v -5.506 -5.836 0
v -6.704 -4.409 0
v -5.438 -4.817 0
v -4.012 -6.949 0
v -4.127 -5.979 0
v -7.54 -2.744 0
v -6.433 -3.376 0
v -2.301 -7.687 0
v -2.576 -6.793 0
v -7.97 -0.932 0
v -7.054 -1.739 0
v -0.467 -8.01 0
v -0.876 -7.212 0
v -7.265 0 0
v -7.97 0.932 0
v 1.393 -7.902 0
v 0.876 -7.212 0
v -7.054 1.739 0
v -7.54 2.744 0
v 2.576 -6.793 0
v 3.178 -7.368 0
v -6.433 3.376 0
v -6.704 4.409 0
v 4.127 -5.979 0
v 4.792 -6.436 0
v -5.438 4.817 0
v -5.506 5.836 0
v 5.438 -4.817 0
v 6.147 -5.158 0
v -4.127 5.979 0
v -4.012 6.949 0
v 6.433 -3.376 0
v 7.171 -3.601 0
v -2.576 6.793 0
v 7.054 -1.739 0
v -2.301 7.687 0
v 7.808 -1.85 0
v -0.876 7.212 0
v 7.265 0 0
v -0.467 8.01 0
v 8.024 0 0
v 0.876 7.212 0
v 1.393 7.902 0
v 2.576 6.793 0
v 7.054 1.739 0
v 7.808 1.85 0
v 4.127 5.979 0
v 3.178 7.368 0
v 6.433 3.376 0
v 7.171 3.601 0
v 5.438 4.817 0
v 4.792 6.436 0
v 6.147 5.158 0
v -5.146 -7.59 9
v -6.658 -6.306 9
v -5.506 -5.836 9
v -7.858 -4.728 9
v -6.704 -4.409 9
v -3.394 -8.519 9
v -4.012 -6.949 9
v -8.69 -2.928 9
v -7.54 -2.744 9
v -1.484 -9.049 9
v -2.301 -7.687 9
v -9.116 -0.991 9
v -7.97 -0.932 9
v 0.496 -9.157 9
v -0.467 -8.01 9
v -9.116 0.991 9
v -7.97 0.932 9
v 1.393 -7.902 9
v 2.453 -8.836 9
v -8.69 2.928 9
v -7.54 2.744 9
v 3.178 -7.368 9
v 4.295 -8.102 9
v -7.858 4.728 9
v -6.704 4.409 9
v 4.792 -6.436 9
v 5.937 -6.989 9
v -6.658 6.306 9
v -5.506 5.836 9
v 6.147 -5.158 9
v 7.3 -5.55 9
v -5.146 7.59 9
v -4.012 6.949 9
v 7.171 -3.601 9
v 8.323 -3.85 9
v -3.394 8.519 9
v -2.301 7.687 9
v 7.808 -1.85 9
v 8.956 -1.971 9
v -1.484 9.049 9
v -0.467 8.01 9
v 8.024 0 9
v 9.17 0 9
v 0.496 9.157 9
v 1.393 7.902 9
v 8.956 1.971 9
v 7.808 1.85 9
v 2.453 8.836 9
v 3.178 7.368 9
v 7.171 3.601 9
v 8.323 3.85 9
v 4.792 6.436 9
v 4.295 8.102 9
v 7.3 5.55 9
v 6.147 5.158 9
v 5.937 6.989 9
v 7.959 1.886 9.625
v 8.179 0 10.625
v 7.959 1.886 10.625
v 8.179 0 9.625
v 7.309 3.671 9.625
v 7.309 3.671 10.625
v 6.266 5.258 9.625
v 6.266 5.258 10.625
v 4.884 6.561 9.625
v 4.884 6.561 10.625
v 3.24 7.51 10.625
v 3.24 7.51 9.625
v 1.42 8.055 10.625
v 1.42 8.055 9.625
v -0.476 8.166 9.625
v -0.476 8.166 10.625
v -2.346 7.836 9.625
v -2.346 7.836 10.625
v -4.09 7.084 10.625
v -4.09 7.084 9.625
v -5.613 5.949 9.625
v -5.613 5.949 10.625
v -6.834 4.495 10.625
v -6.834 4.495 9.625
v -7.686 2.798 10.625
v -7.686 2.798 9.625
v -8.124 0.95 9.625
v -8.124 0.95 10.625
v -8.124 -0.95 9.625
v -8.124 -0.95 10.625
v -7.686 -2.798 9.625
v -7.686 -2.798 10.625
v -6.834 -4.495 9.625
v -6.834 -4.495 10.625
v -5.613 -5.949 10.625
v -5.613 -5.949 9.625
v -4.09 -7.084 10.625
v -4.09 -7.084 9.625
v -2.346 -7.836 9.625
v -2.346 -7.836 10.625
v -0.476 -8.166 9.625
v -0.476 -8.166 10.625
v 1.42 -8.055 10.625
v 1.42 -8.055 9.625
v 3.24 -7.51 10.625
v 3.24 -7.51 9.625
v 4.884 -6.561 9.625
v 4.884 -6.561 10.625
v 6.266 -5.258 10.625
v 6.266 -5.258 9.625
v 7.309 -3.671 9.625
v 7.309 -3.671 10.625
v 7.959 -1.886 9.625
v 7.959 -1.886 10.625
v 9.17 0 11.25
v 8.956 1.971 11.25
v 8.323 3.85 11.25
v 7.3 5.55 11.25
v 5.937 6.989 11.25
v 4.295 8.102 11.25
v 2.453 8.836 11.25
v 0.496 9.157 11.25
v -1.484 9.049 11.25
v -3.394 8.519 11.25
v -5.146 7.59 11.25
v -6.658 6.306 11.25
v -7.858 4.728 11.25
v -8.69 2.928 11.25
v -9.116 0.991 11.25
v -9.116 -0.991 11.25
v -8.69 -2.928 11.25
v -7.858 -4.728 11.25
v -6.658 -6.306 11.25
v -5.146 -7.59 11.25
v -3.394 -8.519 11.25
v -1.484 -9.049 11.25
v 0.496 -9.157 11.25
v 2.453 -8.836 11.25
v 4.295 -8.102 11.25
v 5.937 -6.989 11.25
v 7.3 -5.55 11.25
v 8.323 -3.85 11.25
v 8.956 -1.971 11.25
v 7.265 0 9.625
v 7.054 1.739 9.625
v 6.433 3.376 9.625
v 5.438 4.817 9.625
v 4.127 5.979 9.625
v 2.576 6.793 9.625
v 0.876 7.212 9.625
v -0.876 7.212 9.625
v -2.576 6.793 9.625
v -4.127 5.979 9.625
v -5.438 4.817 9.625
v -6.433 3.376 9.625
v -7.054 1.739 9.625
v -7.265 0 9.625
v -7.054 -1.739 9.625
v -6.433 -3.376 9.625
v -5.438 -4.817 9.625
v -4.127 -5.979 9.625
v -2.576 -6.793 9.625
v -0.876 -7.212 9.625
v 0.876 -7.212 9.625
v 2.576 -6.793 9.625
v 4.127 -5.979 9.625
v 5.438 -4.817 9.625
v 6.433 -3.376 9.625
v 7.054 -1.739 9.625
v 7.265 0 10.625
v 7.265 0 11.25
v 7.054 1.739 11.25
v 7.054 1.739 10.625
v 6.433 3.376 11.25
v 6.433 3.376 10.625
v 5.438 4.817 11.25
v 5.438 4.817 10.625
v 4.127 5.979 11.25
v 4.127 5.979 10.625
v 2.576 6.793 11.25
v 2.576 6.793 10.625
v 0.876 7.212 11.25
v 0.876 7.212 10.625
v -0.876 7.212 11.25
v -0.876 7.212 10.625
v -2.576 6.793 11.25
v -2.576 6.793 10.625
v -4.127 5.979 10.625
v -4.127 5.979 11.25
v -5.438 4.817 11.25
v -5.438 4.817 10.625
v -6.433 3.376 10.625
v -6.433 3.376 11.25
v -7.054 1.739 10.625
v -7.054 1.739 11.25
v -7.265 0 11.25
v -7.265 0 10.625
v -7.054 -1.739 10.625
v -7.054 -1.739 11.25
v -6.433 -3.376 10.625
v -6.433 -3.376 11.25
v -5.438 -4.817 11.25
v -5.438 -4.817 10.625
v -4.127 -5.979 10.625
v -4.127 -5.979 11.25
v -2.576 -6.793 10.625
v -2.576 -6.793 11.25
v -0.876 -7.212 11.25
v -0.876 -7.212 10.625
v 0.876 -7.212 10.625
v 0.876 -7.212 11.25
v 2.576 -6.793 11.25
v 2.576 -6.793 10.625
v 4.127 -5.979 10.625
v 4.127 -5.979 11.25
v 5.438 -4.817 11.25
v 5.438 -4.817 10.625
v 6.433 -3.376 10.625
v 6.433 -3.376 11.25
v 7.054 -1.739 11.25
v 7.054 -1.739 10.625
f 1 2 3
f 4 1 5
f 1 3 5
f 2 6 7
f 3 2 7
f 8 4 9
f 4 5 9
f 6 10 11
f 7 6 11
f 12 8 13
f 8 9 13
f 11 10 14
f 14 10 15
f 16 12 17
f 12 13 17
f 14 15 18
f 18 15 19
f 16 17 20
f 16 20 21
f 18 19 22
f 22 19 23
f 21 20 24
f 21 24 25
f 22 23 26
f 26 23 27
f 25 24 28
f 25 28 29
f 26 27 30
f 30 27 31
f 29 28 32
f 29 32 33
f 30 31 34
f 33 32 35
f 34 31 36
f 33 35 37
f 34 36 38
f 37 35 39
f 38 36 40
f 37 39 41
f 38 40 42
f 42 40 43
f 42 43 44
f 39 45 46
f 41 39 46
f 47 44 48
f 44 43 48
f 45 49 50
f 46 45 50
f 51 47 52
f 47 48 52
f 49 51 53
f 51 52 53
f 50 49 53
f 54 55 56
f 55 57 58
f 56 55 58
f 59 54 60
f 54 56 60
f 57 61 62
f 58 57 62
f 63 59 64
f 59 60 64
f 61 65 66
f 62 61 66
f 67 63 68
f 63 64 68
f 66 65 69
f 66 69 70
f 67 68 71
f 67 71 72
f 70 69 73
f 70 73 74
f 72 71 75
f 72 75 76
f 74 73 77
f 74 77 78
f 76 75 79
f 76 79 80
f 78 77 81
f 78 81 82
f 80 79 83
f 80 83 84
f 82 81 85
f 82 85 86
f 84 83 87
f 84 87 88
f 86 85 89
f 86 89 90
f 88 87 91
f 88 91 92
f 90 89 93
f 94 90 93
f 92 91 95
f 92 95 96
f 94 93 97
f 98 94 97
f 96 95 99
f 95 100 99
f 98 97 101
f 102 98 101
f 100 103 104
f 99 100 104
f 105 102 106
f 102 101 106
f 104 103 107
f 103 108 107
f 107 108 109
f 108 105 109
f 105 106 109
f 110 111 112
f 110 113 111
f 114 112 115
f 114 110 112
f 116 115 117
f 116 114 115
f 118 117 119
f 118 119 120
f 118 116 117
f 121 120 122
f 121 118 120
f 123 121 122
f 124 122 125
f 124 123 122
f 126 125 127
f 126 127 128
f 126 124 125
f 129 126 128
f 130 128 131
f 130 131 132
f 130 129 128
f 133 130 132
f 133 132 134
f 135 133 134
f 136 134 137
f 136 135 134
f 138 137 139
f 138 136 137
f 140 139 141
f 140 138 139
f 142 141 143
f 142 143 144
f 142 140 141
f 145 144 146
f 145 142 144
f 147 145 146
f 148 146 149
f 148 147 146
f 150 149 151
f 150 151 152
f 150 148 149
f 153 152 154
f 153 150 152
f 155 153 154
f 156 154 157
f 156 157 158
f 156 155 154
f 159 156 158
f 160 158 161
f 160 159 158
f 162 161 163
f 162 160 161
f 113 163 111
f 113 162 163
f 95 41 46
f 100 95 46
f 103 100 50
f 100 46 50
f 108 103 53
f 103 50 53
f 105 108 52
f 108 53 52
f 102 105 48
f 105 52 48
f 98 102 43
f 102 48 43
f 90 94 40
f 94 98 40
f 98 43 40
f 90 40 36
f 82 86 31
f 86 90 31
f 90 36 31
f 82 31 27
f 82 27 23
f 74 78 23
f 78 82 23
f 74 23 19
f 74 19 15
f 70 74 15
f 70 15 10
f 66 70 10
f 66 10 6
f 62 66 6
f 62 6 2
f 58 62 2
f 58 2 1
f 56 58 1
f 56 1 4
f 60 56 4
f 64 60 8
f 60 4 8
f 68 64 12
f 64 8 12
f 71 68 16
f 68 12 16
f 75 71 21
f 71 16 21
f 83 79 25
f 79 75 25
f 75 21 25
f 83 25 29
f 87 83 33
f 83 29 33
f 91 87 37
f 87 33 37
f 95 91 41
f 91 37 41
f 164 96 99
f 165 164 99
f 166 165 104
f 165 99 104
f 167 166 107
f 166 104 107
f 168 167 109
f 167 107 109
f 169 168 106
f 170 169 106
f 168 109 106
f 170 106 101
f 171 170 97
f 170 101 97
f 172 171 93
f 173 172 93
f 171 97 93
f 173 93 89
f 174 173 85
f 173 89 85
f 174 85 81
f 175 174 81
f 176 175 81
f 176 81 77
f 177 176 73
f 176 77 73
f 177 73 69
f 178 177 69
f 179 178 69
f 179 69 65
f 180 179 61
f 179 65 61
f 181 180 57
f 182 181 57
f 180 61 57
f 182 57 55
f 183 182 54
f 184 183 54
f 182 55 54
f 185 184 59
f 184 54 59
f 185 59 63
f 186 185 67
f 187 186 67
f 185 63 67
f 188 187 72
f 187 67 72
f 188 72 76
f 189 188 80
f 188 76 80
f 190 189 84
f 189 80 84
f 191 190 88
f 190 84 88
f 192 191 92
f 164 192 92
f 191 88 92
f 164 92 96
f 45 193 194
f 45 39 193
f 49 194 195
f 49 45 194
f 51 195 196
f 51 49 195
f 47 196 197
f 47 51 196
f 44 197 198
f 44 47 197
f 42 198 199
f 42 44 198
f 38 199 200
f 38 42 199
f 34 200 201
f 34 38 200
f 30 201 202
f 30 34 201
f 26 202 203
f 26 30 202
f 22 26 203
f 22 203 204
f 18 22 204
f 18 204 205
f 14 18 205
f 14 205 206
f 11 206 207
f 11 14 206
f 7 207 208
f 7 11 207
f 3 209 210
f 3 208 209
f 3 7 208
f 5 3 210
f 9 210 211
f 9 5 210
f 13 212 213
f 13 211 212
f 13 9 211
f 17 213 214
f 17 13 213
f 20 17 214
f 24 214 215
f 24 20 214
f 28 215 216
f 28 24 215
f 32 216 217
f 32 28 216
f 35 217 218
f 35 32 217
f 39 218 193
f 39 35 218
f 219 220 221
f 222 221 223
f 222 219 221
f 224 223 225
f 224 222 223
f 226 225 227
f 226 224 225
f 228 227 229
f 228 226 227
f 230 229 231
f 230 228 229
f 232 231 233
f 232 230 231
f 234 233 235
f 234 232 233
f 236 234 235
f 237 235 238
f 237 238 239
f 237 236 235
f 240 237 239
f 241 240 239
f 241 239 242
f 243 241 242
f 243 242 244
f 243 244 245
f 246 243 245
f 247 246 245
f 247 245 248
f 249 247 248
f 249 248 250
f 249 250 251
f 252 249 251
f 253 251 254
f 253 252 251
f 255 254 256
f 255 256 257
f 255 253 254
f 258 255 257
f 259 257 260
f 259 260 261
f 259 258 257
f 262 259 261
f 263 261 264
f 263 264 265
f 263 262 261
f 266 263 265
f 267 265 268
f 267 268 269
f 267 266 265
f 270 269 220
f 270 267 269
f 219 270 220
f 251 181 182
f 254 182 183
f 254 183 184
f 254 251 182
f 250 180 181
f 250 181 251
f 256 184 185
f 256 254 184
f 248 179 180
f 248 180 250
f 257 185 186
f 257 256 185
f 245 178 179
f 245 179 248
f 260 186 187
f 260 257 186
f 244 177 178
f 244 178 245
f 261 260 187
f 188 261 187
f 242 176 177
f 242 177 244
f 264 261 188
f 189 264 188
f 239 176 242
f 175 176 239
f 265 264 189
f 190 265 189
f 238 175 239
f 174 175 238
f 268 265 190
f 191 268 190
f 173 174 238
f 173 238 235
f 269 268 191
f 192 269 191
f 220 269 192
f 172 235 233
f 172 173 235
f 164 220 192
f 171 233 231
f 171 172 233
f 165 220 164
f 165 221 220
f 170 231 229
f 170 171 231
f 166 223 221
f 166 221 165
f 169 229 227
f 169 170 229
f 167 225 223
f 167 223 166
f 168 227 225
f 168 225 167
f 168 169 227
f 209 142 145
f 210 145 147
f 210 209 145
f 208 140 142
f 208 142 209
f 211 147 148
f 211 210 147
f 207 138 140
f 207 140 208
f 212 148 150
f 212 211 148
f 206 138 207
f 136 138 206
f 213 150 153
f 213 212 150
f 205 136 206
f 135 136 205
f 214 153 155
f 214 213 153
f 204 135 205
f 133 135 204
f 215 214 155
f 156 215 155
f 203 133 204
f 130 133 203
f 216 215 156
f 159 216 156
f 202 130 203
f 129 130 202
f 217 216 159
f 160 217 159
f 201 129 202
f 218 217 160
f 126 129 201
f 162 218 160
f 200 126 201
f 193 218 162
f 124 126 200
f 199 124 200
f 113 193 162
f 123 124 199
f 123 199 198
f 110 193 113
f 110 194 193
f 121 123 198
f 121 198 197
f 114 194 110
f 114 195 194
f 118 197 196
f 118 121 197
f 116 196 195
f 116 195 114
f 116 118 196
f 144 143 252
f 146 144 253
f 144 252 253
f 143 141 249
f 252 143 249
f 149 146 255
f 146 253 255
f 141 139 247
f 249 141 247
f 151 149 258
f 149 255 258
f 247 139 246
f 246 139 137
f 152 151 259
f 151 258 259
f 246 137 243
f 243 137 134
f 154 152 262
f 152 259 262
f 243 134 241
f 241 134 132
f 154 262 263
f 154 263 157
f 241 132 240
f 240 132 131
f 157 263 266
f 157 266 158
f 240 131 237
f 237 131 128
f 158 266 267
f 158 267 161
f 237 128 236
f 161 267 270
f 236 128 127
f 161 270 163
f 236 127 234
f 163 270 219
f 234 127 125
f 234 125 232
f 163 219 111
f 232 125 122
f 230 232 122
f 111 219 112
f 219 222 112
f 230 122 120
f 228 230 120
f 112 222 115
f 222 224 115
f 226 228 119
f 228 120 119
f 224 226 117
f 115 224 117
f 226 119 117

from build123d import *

# Parameters (mm, degrees)
F0_R          = 16.048100164
F0_R_2        = 14.5297232328
F1_DEPTH      = 20
F2_START      = 18
F0_R_3        = 18.3403382945
F2_DEPTH      = 4.5
F3_SCALE      = 0.5
F5_R          = 8.1793967512
F6_DEPTH      = 0.5
F6_DEPTH_BACK = 0.5


with BuildPart() as f1:
    # F0 (on Top) → F1 (new body)
    with BuildSketch(Plane.XY):
        Circle(F0_R)
        Circle(F0_R_2, mode=Mode.SUBTRACT)
    extrude(amount=F1_DEPTH)

    # F0 (on Top) → F2 (join)
    with BuildSketch(Plane.XY.offset(F2_START)):
        Circle(F0_R_3)
        Circle(F0_R, mode=Mode.SUBTRACT)
        Circle(F0_R)
        Circle(F0_R_2, mode=Mode.SUBTRACT)
    extrude(amount=F2_DEPTH)


with BuildPart() as f1_1:
    # F3: moved
    add(f1.part.scale(F3_SCALE))

    # F5 (on offset) → F6 (cut, two sides)
    with BuildSketch(Plane.XY.offset(10.125)) as f6_sk:
        Circle(F5_R)
    extrude(amount=F6_DEPTH, mode=Mode.SUBTRACT)
    extrude(f6_sk.sketch, amount=-F6_DEPTH_BACK, mode=Mode.SUBTRACT)


solid = f1_1.part
